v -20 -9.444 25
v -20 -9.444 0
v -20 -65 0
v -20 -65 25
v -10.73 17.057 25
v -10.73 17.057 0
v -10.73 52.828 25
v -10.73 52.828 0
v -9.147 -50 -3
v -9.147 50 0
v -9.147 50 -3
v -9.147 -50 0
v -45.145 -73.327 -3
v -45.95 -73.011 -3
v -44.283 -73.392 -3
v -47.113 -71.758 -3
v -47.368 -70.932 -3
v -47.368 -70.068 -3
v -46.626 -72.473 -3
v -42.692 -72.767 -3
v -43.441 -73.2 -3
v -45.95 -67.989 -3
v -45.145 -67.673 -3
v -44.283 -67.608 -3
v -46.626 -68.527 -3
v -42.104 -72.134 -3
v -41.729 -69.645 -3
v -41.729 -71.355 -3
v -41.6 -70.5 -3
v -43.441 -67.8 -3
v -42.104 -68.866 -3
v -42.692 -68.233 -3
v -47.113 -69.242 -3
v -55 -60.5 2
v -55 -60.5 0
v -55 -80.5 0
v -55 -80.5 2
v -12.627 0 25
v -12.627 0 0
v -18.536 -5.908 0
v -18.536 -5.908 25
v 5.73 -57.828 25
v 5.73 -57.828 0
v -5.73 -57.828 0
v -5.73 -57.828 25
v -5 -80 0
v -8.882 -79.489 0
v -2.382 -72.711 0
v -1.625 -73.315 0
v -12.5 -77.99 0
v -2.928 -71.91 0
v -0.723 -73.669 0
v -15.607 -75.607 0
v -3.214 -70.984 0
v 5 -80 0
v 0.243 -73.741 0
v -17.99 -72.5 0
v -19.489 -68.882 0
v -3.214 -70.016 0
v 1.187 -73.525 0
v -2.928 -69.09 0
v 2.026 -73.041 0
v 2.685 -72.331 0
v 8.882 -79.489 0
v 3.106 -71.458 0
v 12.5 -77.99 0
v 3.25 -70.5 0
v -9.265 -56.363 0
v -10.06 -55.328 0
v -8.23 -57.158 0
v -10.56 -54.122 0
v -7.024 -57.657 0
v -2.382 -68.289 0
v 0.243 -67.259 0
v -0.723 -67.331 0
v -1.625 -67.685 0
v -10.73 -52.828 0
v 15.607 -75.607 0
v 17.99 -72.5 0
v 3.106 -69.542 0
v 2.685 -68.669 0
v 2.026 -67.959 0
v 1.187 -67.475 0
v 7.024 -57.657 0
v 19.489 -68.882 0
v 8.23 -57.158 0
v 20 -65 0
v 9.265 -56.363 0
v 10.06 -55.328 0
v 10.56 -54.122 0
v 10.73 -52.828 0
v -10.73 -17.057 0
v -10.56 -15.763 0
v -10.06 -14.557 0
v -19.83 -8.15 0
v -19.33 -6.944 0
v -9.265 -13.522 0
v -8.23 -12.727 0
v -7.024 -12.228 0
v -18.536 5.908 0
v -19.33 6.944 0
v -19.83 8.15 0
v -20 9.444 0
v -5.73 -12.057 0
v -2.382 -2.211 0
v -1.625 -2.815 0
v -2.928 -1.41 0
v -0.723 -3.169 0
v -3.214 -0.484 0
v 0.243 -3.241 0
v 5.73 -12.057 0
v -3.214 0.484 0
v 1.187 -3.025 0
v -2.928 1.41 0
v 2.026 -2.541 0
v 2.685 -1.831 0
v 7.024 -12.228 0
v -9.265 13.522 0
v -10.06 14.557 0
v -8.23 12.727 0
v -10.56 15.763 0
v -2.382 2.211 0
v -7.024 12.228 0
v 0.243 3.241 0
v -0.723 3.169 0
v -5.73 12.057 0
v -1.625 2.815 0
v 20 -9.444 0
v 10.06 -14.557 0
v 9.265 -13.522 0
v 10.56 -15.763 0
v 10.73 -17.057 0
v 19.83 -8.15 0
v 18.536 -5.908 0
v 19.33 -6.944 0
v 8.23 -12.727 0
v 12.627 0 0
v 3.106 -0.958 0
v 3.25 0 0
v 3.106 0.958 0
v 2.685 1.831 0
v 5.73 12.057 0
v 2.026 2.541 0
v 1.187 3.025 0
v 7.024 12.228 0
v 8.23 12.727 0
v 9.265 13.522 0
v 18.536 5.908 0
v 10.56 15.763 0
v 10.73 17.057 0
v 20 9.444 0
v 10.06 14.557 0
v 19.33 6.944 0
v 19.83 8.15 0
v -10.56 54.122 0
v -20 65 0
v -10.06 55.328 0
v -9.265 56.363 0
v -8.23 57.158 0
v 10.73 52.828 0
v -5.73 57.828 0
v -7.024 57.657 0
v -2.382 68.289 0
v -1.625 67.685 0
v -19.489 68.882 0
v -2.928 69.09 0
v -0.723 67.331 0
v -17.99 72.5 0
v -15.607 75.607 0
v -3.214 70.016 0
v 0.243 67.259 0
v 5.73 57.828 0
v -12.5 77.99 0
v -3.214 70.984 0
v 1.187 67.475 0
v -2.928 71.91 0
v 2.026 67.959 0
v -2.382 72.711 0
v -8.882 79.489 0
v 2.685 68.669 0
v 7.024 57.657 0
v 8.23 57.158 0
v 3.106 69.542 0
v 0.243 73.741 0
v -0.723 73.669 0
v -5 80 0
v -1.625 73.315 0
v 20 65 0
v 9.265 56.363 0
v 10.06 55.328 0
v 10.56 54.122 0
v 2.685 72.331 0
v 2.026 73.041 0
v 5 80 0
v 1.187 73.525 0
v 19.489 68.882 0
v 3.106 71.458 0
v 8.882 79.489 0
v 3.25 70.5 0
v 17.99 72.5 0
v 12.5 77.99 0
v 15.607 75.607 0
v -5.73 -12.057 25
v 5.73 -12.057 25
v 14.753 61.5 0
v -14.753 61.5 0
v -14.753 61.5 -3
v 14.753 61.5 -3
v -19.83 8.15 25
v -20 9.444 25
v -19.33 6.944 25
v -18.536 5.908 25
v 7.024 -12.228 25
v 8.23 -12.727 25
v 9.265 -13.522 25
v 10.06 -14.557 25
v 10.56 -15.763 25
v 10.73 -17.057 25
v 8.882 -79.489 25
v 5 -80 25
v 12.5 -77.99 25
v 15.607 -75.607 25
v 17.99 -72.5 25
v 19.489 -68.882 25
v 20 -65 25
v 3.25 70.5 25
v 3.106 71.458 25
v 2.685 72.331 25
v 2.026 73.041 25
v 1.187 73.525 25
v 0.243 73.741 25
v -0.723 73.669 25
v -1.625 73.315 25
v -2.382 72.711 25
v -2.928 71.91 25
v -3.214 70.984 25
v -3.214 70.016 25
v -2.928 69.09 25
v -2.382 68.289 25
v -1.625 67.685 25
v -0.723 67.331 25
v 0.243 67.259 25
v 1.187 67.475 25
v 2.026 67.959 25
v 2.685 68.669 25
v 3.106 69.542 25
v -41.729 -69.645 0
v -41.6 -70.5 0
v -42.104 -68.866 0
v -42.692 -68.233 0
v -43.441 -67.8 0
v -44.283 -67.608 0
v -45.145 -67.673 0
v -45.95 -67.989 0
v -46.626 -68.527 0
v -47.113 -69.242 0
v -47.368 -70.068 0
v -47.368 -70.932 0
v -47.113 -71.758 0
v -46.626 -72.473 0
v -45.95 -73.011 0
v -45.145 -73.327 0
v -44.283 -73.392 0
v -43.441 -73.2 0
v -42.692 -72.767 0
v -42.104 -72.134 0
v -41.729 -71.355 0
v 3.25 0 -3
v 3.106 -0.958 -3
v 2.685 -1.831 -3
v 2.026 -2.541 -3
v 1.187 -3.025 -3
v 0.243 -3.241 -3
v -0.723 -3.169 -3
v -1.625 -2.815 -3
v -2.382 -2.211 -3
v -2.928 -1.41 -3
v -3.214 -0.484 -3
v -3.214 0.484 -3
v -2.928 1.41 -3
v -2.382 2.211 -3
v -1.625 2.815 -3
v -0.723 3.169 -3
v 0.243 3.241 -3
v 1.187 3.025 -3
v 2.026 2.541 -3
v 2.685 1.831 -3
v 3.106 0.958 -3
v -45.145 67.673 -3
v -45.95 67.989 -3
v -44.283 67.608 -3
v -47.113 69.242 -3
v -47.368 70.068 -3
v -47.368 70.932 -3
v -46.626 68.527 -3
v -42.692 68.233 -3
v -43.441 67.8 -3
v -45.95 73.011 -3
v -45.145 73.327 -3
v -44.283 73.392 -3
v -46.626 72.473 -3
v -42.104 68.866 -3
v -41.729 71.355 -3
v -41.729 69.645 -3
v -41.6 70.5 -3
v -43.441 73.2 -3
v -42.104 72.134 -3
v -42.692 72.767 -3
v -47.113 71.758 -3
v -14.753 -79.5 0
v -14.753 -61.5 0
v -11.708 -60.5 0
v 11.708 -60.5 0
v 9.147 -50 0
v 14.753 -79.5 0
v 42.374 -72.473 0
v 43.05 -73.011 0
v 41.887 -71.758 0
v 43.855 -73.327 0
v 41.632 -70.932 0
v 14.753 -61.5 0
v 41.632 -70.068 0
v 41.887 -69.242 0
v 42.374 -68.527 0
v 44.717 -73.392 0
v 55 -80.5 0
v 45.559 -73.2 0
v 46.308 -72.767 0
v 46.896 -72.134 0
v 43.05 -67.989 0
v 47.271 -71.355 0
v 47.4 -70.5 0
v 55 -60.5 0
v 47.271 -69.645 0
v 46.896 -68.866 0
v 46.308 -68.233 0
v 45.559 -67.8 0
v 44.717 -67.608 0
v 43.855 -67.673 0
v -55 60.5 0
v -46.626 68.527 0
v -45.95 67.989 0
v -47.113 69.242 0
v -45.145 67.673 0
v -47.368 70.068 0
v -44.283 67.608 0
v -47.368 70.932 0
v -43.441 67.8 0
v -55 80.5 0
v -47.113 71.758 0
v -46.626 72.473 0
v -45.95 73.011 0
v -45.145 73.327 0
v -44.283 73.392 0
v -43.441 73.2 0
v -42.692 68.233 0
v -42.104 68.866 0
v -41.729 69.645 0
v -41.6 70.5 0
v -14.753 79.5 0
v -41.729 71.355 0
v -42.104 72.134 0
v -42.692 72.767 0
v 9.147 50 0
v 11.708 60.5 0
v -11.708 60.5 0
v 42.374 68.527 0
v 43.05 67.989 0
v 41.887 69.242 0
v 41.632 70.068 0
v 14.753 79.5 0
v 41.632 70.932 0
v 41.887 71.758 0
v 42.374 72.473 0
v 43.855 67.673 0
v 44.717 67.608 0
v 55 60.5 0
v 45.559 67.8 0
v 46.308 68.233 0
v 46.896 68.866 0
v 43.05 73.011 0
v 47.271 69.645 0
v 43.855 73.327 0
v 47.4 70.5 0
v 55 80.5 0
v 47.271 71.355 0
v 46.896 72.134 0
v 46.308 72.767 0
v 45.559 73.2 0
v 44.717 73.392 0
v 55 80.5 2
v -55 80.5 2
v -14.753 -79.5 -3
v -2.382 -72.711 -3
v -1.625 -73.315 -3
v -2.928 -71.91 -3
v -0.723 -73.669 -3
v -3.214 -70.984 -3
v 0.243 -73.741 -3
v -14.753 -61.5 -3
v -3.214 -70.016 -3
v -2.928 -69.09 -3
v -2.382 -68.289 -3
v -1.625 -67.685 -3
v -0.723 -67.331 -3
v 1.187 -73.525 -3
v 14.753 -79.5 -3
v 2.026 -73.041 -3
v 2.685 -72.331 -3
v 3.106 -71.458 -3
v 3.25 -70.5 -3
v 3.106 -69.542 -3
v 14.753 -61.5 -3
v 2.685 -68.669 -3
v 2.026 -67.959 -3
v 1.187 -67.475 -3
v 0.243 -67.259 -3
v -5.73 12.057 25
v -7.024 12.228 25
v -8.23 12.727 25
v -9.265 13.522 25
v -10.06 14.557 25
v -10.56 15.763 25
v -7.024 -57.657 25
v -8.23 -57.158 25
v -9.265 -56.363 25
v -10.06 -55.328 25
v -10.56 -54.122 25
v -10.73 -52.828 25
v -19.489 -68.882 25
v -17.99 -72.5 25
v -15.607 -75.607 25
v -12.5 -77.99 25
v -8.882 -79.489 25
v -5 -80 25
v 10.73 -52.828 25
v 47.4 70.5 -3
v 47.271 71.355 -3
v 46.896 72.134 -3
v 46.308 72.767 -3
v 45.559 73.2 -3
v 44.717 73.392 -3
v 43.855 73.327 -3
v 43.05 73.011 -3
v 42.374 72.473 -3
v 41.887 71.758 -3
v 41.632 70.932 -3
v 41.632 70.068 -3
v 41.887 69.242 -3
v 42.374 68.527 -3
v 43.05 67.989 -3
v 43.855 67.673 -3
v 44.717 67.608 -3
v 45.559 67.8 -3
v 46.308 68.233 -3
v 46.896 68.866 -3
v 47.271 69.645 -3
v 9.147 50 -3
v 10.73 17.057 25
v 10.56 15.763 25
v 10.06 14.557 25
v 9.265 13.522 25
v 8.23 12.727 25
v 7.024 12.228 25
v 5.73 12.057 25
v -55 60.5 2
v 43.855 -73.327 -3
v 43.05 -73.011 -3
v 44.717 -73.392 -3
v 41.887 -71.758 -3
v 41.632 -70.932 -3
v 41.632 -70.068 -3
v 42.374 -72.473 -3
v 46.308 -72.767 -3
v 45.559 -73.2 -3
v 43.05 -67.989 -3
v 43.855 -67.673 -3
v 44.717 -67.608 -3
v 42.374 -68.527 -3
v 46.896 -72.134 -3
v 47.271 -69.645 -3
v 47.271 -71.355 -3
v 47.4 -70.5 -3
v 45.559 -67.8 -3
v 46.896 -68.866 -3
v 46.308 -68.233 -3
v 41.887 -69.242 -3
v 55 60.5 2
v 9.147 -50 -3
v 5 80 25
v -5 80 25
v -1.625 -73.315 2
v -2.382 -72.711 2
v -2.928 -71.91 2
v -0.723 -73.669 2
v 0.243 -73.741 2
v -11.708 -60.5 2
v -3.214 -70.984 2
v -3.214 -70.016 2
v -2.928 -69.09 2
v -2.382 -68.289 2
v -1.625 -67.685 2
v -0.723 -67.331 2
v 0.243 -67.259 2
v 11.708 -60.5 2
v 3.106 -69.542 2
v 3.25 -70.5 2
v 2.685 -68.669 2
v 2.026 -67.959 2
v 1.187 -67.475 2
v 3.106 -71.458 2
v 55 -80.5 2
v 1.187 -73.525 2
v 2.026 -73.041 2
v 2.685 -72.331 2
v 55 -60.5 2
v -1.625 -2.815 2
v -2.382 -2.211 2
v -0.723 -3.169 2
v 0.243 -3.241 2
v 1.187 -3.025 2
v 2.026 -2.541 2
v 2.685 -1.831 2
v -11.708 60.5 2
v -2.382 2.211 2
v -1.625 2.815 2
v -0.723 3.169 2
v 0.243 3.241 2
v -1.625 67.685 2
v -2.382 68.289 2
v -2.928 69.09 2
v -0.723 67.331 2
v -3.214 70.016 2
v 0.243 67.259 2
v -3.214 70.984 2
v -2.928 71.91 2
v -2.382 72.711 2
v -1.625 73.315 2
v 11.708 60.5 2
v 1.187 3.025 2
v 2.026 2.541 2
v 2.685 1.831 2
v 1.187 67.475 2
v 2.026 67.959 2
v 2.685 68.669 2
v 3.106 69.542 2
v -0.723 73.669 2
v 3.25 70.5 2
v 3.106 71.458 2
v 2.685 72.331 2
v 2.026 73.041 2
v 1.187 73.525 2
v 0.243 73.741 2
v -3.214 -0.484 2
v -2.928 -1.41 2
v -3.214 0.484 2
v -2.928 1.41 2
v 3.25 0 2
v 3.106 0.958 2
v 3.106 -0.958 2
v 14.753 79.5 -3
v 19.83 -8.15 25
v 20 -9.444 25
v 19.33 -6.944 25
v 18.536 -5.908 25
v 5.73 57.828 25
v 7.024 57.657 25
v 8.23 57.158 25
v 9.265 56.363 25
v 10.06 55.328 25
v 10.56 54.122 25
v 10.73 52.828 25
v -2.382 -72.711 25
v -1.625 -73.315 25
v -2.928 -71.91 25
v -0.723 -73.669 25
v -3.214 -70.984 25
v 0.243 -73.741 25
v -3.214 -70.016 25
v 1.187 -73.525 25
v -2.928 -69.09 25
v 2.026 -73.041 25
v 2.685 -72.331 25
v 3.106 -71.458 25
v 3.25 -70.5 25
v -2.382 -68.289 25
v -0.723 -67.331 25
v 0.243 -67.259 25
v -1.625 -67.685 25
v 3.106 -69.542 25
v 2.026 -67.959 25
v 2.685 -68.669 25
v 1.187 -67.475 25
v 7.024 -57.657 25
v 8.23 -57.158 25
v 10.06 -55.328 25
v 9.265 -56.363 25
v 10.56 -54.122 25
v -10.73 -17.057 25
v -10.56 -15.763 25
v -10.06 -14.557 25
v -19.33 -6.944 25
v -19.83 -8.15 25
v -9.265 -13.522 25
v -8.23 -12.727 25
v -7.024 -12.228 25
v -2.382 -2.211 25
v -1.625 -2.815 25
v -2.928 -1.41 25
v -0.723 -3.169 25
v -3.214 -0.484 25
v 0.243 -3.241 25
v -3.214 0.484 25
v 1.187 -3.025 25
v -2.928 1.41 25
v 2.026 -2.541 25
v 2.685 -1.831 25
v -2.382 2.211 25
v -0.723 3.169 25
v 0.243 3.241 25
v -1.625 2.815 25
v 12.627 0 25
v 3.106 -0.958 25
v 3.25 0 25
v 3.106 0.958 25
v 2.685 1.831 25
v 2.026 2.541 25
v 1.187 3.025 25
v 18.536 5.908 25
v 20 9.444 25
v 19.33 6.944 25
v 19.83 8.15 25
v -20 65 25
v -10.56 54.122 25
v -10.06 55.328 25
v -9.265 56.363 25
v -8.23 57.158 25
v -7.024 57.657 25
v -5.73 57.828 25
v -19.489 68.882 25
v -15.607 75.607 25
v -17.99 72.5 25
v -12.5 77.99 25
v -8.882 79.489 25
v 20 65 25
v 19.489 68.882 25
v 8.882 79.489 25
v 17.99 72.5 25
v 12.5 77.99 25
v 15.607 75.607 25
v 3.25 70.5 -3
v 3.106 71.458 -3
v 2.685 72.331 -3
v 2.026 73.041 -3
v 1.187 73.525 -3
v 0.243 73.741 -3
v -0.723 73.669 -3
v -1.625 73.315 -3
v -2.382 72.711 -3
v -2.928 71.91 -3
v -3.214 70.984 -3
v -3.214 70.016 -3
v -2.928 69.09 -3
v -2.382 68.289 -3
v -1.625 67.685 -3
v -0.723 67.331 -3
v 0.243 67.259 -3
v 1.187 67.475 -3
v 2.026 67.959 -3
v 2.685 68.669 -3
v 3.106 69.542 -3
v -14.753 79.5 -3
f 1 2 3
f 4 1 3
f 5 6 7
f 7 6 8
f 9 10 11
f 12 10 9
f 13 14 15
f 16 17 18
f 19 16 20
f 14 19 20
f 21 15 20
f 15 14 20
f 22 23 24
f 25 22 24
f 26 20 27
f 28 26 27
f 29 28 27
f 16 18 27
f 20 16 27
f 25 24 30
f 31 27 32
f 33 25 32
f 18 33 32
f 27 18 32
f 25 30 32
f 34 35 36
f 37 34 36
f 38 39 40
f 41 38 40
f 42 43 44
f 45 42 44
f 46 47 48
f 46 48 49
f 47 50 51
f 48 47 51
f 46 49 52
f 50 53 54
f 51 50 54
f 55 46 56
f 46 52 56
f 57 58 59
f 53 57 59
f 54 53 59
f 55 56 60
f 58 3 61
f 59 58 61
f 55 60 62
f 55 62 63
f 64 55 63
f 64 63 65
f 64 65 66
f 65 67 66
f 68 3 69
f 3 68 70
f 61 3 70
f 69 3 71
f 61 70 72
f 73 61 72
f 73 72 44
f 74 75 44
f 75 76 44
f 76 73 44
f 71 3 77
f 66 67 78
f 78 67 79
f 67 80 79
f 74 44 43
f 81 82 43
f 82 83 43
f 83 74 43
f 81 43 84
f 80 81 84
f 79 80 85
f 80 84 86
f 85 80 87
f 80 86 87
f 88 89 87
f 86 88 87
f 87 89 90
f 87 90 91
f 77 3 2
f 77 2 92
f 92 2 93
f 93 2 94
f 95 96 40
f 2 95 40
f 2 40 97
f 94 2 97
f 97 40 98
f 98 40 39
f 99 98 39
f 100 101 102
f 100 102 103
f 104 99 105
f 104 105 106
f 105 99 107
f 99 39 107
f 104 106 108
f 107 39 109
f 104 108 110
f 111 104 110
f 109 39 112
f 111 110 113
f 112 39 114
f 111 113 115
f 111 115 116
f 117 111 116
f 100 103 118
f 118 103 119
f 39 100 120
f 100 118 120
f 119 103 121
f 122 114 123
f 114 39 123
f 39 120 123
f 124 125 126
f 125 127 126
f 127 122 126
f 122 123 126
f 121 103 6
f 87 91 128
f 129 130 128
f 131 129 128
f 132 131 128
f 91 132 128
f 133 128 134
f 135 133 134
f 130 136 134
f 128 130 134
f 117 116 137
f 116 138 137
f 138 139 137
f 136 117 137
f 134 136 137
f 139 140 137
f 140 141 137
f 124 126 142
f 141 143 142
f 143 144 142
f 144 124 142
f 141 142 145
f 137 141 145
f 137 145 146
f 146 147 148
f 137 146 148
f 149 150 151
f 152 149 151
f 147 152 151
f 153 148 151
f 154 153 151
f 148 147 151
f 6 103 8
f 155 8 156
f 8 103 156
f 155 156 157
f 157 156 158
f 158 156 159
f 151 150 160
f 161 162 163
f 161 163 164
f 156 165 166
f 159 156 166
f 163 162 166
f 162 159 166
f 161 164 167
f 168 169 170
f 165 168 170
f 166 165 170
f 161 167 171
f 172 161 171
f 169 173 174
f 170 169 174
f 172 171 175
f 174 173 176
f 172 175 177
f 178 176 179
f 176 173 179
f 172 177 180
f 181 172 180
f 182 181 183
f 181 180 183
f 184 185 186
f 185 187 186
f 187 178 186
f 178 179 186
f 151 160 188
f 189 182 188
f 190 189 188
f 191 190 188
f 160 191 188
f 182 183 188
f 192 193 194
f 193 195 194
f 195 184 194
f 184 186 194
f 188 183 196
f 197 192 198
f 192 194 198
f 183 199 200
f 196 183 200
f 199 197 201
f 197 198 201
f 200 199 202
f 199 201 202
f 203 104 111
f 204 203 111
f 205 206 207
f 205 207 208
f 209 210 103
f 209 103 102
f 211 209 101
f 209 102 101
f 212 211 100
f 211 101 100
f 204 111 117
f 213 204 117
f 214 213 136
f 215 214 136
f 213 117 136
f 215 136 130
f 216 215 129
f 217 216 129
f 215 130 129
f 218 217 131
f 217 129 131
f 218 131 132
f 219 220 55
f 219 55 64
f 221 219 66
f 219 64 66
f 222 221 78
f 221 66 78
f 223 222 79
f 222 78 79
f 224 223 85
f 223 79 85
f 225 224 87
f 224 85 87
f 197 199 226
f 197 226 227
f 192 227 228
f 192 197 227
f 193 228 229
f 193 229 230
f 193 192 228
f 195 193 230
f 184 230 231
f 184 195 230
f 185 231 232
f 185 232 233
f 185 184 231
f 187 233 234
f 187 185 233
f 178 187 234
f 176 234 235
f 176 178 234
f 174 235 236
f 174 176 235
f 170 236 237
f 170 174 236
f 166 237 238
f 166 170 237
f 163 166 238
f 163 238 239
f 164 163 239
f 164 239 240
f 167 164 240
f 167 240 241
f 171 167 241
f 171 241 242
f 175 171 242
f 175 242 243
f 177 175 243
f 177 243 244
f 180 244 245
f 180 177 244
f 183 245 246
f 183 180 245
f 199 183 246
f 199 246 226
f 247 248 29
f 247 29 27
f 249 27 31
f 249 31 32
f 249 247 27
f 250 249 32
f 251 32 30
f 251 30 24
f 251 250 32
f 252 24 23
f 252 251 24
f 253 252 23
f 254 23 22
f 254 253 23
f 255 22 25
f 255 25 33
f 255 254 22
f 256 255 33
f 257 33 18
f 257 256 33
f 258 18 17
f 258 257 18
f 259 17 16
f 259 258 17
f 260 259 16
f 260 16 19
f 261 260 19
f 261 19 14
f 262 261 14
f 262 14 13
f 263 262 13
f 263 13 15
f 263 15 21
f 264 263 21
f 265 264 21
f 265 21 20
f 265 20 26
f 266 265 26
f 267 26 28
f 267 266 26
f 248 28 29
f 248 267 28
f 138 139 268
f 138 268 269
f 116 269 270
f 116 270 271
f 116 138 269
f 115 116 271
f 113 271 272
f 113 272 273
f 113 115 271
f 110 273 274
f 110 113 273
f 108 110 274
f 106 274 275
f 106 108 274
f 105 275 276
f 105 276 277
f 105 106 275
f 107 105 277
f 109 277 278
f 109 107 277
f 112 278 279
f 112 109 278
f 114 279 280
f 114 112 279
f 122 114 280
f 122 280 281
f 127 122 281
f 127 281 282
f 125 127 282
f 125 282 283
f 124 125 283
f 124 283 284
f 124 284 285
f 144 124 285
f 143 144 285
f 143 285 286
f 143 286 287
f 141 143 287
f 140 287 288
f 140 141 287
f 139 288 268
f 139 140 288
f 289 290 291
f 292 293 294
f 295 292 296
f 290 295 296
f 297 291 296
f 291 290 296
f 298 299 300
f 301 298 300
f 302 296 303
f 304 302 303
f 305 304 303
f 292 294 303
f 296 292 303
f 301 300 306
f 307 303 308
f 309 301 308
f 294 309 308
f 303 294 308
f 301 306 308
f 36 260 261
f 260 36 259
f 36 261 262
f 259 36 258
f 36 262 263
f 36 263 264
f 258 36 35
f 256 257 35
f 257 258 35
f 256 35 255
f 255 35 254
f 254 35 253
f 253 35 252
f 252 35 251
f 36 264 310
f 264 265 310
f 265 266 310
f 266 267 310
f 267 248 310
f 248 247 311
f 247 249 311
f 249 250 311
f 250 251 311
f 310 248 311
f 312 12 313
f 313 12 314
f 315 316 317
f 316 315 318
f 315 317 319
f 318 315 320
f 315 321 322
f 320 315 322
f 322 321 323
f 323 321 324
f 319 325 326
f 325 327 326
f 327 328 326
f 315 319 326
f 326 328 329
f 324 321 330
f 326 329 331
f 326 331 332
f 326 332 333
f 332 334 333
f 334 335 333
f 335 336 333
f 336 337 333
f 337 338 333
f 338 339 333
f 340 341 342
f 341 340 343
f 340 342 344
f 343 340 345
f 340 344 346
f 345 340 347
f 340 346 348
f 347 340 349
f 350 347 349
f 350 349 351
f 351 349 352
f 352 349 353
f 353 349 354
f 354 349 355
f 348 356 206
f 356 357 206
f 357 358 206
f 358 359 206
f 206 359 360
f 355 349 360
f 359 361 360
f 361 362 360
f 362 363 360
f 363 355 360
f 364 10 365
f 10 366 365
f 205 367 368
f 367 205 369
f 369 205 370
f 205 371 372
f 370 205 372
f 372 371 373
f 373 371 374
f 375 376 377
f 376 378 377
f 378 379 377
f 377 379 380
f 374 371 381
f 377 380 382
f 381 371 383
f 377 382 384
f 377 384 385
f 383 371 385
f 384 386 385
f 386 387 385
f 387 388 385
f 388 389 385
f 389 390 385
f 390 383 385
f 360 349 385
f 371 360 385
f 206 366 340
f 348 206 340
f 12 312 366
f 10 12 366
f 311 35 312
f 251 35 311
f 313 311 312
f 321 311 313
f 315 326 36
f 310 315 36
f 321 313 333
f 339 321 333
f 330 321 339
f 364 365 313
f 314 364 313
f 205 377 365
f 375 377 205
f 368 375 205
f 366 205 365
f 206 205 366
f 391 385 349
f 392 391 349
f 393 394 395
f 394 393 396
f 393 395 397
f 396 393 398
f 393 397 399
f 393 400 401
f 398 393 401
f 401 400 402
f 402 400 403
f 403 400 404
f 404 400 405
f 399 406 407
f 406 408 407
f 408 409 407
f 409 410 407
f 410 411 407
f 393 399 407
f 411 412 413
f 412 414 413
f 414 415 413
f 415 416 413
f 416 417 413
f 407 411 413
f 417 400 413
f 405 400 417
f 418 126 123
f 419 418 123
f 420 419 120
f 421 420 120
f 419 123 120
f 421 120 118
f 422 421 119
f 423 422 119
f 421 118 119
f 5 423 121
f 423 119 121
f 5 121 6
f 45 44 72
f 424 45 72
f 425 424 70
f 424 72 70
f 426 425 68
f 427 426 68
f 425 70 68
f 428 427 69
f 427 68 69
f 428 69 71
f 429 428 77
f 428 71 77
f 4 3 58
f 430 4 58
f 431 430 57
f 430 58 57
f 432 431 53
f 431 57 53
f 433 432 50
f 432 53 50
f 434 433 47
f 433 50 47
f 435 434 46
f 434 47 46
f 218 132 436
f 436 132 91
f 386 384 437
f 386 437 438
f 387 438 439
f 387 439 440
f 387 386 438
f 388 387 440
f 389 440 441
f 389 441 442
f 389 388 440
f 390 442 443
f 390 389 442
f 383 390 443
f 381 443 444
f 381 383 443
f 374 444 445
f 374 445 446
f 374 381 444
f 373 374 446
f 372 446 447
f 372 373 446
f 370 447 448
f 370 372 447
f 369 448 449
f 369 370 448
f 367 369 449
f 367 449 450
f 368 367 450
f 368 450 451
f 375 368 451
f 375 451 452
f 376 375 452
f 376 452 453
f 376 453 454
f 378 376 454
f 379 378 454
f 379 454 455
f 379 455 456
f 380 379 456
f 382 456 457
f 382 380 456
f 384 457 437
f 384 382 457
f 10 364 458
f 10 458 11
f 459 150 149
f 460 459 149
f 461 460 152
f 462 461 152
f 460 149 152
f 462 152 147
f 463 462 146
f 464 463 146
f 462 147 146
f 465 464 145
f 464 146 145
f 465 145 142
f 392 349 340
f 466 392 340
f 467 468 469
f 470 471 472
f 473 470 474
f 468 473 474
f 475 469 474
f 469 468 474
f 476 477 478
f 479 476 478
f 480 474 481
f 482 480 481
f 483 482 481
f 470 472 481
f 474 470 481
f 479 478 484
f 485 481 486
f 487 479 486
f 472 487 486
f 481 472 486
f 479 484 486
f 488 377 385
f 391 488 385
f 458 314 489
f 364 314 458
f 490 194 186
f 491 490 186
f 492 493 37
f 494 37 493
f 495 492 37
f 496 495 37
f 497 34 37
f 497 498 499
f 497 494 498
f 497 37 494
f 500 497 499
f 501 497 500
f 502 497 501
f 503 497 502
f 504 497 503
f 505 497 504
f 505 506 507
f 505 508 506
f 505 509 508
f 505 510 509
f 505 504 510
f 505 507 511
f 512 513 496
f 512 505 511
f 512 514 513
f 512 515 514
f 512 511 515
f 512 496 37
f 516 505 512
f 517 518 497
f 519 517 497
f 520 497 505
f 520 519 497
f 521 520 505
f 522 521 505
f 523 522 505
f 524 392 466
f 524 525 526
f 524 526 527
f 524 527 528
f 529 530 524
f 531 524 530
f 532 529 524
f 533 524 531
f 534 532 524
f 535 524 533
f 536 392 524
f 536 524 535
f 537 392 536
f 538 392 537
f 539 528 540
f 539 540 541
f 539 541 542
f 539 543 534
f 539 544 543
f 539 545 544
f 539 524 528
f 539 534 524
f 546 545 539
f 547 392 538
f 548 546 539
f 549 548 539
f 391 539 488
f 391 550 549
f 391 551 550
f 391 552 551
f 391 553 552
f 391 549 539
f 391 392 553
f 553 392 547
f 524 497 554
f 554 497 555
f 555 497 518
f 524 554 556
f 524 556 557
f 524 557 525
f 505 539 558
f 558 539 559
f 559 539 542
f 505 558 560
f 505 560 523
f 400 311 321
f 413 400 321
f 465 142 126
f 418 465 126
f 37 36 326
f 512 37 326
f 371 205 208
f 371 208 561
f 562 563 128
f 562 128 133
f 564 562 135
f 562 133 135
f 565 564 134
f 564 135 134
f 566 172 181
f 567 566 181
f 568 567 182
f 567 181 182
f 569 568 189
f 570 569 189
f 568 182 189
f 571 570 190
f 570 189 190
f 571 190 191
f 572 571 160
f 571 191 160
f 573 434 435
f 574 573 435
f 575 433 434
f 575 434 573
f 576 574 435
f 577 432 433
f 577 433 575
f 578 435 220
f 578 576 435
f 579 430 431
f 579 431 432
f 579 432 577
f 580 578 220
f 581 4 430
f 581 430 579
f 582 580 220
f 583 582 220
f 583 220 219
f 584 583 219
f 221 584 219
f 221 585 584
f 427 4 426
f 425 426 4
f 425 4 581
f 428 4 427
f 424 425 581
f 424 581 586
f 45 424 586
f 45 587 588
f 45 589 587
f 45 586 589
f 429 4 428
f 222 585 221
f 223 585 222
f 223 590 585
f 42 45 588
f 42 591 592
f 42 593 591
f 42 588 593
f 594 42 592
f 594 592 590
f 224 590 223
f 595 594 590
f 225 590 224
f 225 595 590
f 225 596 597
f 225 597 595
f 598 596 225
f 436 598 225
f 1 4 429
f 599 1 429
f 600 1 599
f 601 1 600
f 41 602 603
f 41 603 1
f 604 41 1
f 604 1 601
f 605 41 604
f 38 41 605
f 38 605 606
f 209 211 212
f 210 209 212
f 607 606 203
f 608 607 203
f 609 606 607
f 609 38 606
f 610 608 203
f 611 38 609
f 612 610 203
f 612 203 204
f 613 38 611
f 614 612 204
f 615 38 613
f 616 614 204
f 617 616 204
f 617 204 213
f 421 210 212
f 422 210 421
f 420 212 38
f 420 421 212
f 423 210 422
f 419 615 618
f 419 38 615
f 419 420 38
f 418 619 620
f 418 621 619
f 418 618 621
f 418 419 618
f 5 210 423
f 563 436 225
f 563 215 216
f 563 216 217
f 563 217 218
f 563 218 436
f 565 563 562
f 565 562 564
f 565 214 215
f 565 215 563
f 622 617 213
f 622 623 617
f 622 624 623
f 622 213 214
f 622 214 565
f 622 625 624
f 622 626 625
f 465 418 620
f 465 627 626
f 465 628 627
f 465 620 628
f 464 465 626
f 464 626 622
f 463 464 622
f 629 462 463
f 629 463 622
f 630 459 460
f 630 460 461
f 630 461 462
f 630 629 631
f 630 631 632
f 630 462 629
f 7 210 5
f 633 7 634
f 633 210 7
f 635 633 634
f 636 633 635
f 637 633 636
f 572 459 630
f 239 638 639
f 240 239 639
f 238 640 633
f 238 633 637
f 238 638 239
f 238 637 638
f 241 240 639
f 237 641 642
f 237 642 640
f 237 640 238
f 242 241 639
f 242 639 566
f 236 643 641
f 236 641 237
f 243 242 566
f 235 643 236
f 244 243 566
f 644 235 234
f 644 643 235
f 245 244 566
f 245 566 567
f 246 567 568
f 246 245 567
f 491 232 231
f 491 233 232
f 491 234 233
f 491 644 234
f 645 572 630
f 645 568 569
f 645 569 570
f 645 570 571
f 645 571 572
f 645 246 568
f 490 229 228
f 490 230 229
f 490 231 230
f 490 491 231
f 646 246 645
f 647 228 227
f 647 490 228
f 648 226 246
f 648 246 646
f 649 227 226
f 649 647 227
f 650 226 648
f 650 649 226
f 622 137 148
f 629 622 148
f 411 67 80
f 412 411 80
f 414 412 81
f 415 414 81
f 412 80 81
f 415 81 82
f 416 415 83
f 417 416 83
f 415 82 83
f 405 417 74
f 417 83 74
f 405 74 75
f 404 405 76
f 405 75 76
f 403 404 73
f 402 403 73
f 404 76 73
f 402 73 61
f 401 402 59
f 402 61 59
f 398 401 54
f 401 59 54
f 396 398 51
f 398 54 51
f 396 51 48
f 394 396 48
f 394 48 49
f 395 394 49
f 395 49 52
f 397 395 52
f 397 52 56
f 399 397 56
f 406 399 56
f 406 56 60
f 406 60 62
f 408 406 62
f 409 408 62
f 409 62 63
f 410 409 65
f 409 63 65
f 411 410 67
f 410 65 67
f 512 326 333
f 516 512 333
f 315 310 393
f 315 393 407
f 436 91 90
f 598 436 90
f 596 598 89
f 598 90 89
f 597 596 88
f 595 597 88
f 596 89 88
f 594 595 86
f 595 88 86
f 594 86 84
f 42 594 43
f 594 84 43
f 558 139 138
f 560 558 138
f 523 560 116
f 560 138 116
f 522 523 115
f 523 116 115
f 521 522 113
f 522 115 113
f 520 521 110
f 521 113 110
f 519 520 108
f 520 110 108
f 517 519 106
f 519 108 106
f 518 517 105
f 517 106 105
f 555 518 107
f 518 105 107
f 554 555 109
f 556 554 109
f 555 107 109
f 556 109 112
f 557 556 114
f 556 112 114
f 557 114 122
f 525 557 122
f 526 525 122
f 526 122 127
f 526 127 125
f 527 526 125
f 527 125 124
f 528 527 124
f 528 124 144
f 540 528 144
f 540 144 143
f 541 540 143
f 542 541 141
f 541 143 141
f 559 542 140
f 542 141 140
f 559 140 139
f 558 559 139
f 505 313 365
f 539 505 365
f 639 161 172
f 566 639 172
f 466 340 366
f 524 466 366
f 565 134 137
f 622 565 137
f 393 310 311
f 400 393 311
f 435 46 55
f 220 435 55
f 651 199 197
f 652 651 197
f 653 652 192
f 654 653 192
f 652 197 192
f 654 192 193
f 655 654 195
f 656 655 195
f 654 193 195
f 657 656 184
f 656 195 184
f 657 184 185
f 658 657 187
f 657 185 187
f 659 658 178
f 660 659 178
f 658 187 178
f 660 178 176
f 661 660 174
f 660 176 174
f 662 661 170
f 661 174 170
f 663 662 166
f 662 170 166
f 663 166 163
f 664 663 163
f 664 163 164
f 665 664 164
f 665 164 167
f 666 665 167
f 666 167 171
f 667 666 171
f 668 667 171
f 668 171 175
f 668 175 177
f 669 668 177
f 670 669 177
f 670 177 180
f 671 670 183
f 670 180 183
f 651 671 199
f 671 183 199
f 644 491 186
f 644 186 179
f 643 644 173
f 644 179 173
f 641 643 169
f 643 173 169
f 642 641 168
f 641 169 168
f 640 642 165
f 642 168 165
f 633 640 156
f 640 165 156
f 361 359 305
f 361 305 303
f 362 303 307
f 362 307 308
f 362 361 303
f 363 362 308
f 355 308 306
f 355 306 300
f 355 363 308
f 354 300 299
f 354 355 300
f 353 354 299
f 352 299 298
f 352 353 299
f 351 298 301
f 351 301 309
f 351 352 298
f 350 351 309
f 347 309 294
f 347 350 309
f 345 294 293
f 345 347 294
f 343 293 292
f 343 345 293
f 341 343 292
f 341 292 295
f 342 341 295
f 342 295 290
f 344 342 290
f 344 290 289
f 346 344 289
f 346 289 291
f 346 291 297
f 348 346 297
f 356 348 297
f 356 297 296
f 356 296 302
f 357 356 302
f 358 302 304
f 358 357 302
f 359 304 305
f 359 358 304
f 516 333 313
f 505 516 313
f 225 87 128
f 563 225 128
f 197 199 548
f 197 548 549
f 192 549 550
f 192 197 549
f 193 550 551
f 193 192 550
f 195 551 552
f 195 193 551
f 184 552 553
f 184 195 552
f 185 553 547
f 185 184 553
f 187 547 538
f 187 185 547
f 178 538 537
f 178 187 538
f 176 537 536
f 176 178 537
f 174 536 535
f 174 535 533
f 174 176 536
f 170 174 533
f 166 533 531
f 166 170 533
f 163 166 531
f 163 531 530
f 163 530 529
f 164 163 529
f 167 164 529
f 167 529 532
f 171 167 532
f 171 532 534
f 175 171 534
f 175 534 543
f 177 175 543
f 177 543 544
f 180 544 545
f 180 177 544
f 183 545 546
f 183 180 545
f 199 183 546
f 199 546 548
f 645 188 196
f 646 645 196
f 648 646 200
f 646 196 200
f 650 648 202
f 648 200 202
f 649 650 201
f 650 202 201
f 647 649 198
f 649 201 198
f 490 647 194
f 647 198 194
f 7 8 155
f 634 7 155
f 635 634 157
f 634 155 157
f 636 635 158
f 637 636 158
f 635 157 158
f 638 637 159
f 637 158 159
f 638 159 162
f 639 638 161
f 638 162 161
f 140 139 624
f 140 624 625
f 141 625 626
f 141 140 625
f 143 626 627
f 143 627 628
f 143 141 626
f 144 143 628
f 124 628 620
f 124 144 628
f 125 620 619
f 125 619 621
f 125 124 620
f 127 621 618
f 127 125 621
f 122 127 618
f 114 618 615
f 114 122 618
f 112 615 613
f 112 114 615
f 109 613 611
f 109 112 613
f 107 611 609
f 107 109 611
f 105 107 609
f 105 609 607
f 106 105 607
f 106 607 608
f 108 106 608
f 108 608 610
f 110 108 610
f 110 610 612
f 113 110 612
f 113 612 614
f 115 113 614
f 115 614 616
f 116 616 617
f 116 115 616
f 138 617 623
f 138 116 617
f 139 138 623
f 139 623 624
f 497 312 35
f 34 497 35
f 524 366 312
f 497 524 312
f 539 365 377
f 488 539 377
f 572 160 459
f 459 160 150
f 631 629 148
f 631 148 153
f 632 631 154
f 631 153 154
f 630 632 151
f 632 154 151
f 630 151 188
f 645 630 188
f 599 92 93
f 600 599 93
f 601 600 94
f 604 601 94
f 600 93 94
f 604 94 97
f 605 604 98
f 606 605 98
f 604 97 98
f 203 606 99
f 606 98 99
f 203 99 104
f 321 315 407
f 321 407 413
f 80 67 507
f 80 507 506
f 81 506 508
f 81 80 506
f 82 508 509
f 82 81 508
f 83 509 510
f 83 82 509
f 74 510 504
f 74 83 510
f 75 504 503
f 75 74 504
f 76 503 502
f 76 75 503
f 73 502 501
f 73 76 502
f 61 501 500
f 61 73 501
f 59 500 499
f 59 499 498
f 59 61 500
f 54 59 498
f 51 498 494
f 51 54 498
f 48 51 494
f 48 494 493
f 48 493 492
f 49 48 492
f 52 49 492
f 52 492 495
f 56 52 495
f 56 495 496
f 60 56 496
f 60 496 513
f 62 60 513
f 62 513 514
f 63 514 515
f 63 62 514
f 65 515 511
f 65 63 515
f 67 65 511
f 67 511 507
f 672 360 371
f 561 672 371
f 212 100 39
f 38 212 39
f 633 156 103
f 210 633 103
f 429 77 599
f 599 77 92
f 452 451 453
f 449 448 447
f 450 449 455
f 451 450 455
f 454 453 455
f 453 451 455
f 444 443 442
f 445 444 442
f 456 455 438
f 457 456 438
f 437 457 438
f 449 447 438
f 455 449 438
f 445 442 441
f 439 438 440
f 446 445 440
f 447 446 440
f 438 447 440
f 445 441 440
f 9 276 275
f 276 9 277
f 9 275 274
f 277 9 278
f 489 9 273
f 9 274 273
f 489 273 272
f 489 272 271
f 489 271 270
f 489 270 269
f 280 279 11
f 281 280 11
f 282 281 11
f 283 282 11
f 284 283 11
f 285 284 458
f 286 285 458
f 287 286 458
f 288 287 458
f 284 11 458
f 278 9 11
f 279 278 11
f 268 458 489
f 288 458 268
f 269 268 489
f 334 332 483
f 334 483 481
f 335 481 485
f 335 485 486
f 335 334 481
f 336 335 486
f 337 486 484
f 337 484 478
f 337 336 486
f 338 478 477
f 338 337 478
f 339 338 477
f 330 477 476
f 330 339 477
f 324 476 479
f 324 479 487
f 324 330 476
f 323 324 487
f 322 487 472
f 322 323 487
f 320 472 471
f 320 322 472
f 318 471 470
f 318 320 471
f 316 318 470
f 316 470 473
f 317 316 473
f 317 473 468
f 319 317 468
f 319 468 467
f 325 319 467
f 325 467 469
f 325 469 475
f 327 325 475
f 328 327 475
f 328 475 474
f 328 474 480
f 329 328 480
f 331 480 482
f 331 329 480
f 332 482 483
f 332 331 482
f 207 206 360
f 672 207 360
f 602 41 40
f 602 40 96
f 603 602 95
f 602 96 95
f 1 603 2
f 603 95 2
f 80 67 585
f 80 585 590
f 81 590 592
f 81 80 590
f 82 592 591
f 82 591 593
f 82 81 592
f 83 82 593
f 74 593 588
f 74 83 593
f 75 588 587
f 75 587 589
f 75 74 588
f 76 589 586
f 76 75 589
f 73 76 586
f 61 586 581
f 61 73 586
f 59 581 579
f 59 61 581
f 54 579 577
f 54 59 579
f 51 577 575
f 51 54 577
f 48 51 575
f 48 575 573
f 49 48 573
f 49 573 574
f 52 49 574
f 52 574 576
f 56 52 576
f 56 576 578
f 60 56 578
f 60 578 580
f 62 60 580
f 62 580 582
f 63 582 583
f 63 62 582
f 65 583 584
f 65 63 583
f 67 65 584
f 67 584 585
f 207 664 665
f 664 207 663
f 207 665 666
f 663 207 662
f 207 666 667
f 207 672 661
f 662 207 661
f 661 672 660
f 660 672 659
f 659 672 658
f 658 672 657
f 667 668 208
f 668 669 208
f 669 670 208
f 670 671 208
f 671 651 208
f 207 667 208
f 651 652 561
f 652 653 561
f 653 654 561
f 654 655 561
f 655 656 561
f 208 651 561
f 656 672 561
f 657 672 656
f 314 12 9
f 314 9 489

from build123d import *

# Parameters (mm, degrees)
F0_R     = 2.9
F0_W     = 29.5052044094
F0_H     = 18
F0_R_2   = 3.25
F1_DEPTH = 2
F2_DEPTH = 3
F3_R     = 3.25
F4_DEPTH = 25


# Not quite as in the source:
# - a feature names something its author has since deleted; it is built from what else it names


with BuildPart() as f1:
    # F0 (on Top) → F1 (new body)
    with BuildSketch(Plane.XY):
        Polygon((55, 80.5), (-55, 80.5), (-55, 60.5), (-11.7076300085, 60.5), (-11.7076300085, 0), (-9.1474745423, 0), (-9.1474745423, 50), (9.1474745423, 50), (9.1474745423, 0), (11.7076300085, 0), (11.7076300085, 60.5), (55, 60.5), align=None)
        with Locations((-44.5, 70.5)):
            Circle(F0_R, mode=Mode.SUBTRACT)
        with Locations((0, 70.5)):
            Rectangle(F0_W, F0_H, mode=Mode.SUBTRACT)
        with Locations((44.5, 70.5)):
            Circle(F0_R, mode=Mode.SUBTRACT)
        Polygon((-9.1474745423, 0), (-11.7076300085, 0), (-11.7076300085, -60.5), (-55, -60.5), (-55, -80.5), (55, -80.5), (55, -60.5), (11.7076300085, -60.5), (11.7076300085, -10), (11.7076300085, 0), (9.1474745423, 0), (9.1474745423, -50), (-9.1474745423, -50), align=None)
        with Locations((-44.5, -70.5)):
            Circle(F0_R, mode=Mode.SUBTRACT)
        with Locations((0, -70.5)):
            Rectangle(F0_W, F0_H, mode=Mode.SUBTRACT)
        with Locations((44.5, -70.5)):
            Circle(F0_R, mode=Mode.SUBTRACT)
        with Locations((44.5, 70.5)):
            Circle(F0_R)
        with Locations((-44.5, 70.5)):
            Circle(F0_R)
        with Locations((-44.5, -70.5)):
            Circle(F0_R)
        with Locations((44.5, -70.5)):
            Circle(F0_R)
        with Locations((0, 70.5)):
            Rectangle(F0_W, F0_H)
        with Locations((0, 70.5)):
            Circle(F0_R_2, mode=Mode.SUBTRACT)
        with Locations((0, -70.5)):
            Rectangle(F0_W, F0_H)
        with Locations((0, -70.5)):
            Circle(F0_R_2, mode=Mode.SUBTRACT)
        with BuildLine():
            Line((-9.1474745423, 50), (-9.1474745423, 0))
            Line((-9.1474745423, 0), (-3.25, 0))
            ThreePointArc((-3.25, 0), (0, 3.25), (3.25, 0))
            Line((3.25, 0), (9.1474745423, 0))
            Line((9.1474745423, 0), (9.1474745423, 50))
            Line((9.1474745423, 50), (-9.1474745423, 50))
        make_face()
        with BuildLine():
            Line((-3.25, 0), (-9.1474745423, 0))
            Line((-9.1474745423, 0), (-9.1474745423, -50))
            Line((-9.1474745423, -50), (9.1474745423, -50))
            Line((9.1474745423, -50), (9.1474745423, 0))
            Line((9.1474745423, 0), (3.25, 0))
            ThreePointArc((3.25, 0), (0, -3.25), (-3.25, 0))
        make_face()
    extrude(amount=F1_DEPTH)

    # F0 (on Top) → F2 (join)
    with BuildSketch(Plane.XY):
        with Locations((44.5, 70.5)):
            Circle(F0_R)
        with Locations((-44.5, 70.5)):
            Circle(F0_R)
        with Locations((44.5, -70.5)):
            Circle(F0_R)
        with Locations((-44.5, -70.5)):
            Circle(F0_R)
        with Locations((0, 70.5)):
            Rectangle(F0_W, F0_H)
        with Locations((0, 70.5)):
            Circle(F0_R_2, mode=Mode.SUBTRACT)
        with Locations((0, -70.5)):
            Rectangle(F0_W, F0_H)
        with Locations((0, -70.5)):
            Circle(F0_R_2, mode=Mode.SUBTRACT)
        with BuildLine():
            Line((-9.1474745423, 50), (-9.1474745423, 0))
            Line((-9.1474745423, 0), (-3.25, 0))
            ThreePointArc((-3.25, 0), (0, 3.25), (3.25, 0))
            Line((3.25, 0), (9.1474745423, 0))
            Line((9.1474745423, 0), (9.1474745423, 50))
            Line((9.1474745423, 50), (-9.1474745423, 50))
        make_face()
        with BuildLine():
            Line((-3.25, 0), (-9.1474745423, 0))
            Line((-9.1474745423, 0), (-9.1474745423, -50))
            Line((-9.1474745423, -50), (9.1474745423, -50))
            Line((9.1474745423, -50), (9.1474745423, 0))
            Line((9.1474745423, 0), (3.25, 0))
            ThreePointArc((3.25, 0), (0, -3.25), (-3.25, 0))
        make_face()
    extrude(amount=-F2_DEPTH)


with BuildPart() as f4:
    # F3 (on Top) → F4 (new body)
    with BuildSketch(Plane.XY):
        with BuildLine():
            ThreePointArc((-5, 80), (-15.6066017178, 75.6066017178), (-20, 65))
            Line((-20, 65), (-20, 9.4436440896))
            ThreePointArc((-20, 9.4436440896), (-19.6193976626, 7.5302269277), (-18.5355339059, 5.9081101836))
            Line((-18.5355339059, 5.9081101836), (-12.6274237223, 0))
            Line((-12.6274237223, 0), (-18.5355339059, -5.9081101836))
            ThreePointArc((-18.5355339059, -5.9081101836), (-19.6193976626, -7.5302269277), (-20, -9.4436440896))
            Line((-20, -9.4436440896), (-20, -65))
            ThreePointArc((-20, -65), (-15.6066017178, -75.6066017178), (-5, -80))
            Line((-5, -80), (5, -80))
            ThreePointArc((5, -80), (15.6066017178, -75.6066017178), (20, -65))
            Line((20, -65), (20, -9.4436440896))
            ThreePointArc((20, -9.4436440896), (19.6193976626, -7.5302269277), (18.5355339059, -5.9081101836))
            Line((18.5355339059, -5.9081101836), (12.6274237223, 0))
            Line((12.6274237223, 0), (18.5355339059, 5.9081101836))
            ThreePointArc((18.5355339059, 5.9081101836), (19.6193976626, 7.5302269277), (20, 9.4436440896))
            Line((20, 9.4436440896), (20, 65))
            ThreePointArc((20, 65), (15.6066017178, 75.6066017178), (5, 80))
            Line((5, 80), (-5, 80))
        make_face()
        with BuildLine():
            Line((10.7299620286, -17.0571833104), (10.7299620286, -52.8276179731))
            ThreePointArc((10.7299620286, -52.8276179731), (9.2654959345, -56.363151879), (5.7299620286, -57.8276179731))
            Line((5.7299620286, -57.8276179731), (-5.7299620286, -57.8276179731))
            ThreePointArc((-5.7299620286, -57.8276179731), (-9.2654959345, -56.363151879), (-10.7299620286, -52.8276179731))
            Line((-10.7299620286, -52.8276179731), (-10.7299620286, -17.0571833104))
            ThreePointArc((-10.7299620286, -17.0571833104), (-9.2654959345, -13.5216494045), (-5.7299620286, -12.0571833104))
            Line((-5.7299620286, -12.0571833104), (5.7299620286, -12.0571833104))
            ThreePointArc((5.7299620286, -12.0571833104), (9.2654959345, -13.5216494045), (10.7299620286, -17.0571833104))
        make_face(mode=Mode.SUBTRACT)
        with Locations((0, -70.5)):
            Circle(F3_R, mode=Mode.SUBTRACT)
        Circle(F3_R, mode=Mode.SUBTRACT)
        with BuildLine():
            ThreePointArc((-10.7299620286, 52.8276179731), (-9.2654959345, 56.363151879), (-5.7299620286, 57.8276179731))
            Line((-5.7299620286, 57.8276179731), (5.7299620286, 57.8276179731))
            ThreePointArc((5.7299620286, 57.8276179731), (9.2654959345, 56.363151879), (10.7299620286, 52.8276179731))
            Line((10.7299620286, 52.8276179731), (10.7299620286, 17.0571833104))
            ThreePointArc((10.7299620286, 17.0571833104), (9.2654959345, 13.5216494045), (5.7299620286, 12.0571833104))
            Line((5.7299620286, 12.0571833104), (-5.7299620286, 12.0571833104))
            ThreePointArc((-5.7299620286, 12.0571833104), (-9.2654959345, 13.5216494045), (-10.7299620286, 17.0571833104))
            Line((-10.7299620286, 17.0571833104), (-10.7299620286, 52.8276179731))
        make_face(mode=Mode.SUBTRACT)
        with Locations((0, 70.5)):
            Circle(F3_R, mode=Mode.SUBTRACT)
    extrude(amount=F4_DEPTH)


solid = Compound([f1.part, f4.part])
